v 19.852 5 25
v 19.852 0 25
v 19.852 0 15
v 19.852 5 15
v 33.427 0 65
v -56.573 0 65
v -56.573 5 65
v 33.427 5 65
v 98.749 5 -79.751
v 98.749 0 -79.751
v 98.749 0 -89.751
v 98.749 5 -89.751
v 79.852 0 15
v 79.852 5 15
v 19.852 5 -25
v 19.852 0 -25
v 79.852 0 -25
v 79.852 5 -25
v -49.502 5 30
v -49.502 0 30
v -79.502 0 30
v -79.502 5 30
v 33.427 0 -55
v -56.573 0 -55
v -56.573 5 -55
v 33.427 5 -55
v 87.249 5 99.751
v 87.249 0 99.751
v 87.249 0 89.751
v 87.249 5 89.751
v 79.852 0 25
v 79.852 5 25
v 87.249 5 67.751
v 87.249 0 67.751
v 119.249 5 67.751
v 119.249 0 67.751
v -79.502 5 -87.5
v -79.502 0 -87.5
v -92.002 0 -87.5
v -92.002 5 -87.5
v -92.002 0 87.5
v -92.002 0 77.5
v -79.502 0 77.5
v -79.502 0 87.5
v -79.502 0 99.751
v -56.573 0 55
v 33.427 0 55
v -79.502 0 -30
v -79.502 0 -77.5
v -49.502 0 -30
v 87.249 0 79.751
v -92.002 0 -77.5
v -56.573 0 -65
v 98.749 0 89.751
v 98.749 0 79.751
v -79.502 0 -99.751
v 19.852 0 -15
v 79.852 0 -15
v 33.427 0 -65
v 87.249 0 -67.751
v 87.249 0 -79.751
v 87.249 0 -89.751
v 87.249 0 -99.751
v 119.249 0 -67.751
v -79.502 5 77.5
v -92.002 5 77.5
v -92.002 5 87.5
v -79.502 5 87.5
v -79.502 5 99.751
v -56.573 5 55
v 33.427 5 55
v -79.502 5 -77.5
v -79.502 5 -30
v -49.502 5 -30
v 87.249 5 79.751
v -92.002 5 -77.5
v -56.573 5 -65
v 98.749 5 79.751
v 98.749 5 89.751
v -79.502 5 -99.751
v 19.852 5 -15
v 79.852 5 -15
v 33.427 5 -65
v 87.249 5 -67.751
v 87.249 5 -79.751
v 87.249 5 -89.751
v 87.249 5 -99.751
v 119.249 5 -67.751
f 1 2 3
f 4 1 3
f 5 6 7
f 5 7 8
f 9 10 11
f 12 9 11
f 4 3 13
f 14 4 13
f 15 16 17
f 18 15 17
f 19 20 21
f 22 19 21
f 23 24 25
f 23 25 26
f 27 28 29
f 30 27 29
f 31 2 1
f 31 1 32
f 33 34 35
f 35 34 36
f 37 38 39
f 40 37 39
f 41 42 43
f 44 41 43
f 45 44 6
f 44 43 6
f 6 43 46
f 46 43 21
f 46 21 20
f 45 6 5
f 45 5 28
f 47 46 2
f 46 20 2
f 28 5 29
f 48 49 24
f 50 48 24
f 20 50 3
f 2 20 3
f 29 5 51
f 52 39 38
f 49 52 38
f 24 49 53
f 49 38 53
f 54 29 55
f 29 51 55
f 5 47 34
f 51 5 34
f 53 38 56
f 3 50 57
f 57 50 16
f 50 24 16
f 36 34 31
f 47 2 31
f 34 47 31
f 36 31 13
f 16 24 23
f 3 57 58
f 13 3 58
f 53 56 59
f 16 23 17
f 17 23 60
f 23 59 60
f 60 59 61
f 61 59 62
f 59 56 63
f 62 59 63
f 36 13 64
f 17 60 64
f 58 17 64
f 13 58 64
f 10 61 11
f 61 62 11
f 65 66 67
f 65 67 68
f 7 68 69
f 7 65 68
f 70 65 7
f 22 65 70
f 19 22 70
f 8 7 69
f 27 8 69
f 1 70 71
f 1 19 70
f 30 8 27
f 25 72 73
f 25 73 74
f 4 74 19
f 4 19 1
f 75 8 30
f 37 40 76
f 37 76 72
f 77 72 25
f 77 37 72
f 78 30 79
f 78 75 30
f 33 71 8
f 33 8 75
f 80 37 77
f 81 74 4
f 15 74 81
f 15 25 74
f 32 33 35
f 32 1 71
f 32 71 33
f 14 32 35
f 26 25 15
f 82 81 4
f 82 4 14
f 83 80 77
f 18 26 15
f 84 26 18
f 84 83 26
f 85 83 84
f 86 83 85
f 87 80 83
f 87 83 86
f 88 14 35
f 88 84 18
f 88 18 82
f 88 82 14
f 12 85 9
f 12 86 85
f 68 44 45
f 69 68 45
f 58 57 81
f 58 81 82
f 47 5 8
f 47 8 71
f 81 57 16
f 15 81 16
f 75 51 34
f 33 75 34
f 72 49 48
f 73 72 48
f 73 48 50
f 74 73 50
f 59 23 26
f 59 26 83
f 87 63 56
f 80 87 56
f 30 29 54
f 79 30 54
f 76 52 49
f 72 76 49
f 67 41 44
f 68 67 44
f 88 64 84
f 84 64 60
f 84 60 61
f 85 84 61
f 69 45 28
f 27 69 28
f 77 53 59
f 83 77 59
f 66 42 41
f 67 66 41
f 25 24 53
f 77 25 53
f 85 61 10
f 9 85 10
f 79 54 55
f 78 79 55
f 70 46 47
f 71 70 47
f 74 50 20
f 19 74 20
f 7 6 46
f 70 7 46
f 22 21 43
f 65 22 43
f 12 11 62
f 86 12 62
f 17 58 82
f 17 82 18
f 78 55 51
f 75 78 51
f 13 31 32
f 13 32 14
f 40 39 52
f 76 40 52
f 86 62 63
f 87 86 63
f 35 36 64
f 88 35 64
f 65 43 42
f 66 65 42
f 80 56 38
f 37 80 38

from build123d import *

# Parameters (mm, degrees)
CROQUIS2_W              = 60
CROQUIS2_H              = 10
CROQUIS2_W_2            = 90
SALIENTE_EXTRUIR1_DEPTH = 5


with BuildPart() as part:
    # Croquis2 → Saliente-Extruir1 (new body)
    with BuildSketch(Plane(origin=(0, 0, 0), x_dir=(1, 0, 0), z_dir=(0, 1, 0))):
        Polygon((119.248757736, -67.751242264), (119.248757736, 67.751242264), (87.248757736, 67.751242264), (87.248757736, 79.751242264), (98.748757736, 79.751242264), (98.748757736, 89.751242264), (87.248757736, 89.751242264), (87.248757736, 99.751242264), (-79.502303886, 99.751242264), (-79.502303886, 87.5), (-92.002303886, 87.5), (-92.002303886, 77.5), (-79.502303886, 77.5), (-79.502303886, 30), (-49.502303886, 30), (-49.502303886, -30), (-79.502303886, -30), (-79.502303886, -77.5), (-92.002303886, -77.5), (-92.002303886, -87.5), (-79.502303886, -87.5), (-79.502303886, -99.751242264), (87.248757736, -99.751242264), (87.248757736, -89.751242264), (98.748757736, -89.751242264), (98.748757736, -79.751242264), (87.248757736, -79.751242264), (87.248757736, -67.751242264), align=None)
        with Locations((49.851646293, 20)):
            Rectangle(CROQUIS2_W, CROQUIS2_H, mode=Mode.SUBTRACT)
        with Locations((49.851646293, -20)):
            Rectangle(CROQUIS2_W, CROQUIS2_H, mode=Mode.SUBTRACT)
        with Locations((-11.573483533, -60)):
            Rectangle(CROQUIS2_W_2, CROQUIS2_H, mode=Mode.SUBTRACT)
        with Locations((-11.573483533, 60)):
            Rectangle(CROQUIS2_W_2, CROQUIS2_H, mode=Mode.SUBTRACT)
    extrude(amount=SALIENTE_EXTRUIR1_DEPTH)


solid = part.part
